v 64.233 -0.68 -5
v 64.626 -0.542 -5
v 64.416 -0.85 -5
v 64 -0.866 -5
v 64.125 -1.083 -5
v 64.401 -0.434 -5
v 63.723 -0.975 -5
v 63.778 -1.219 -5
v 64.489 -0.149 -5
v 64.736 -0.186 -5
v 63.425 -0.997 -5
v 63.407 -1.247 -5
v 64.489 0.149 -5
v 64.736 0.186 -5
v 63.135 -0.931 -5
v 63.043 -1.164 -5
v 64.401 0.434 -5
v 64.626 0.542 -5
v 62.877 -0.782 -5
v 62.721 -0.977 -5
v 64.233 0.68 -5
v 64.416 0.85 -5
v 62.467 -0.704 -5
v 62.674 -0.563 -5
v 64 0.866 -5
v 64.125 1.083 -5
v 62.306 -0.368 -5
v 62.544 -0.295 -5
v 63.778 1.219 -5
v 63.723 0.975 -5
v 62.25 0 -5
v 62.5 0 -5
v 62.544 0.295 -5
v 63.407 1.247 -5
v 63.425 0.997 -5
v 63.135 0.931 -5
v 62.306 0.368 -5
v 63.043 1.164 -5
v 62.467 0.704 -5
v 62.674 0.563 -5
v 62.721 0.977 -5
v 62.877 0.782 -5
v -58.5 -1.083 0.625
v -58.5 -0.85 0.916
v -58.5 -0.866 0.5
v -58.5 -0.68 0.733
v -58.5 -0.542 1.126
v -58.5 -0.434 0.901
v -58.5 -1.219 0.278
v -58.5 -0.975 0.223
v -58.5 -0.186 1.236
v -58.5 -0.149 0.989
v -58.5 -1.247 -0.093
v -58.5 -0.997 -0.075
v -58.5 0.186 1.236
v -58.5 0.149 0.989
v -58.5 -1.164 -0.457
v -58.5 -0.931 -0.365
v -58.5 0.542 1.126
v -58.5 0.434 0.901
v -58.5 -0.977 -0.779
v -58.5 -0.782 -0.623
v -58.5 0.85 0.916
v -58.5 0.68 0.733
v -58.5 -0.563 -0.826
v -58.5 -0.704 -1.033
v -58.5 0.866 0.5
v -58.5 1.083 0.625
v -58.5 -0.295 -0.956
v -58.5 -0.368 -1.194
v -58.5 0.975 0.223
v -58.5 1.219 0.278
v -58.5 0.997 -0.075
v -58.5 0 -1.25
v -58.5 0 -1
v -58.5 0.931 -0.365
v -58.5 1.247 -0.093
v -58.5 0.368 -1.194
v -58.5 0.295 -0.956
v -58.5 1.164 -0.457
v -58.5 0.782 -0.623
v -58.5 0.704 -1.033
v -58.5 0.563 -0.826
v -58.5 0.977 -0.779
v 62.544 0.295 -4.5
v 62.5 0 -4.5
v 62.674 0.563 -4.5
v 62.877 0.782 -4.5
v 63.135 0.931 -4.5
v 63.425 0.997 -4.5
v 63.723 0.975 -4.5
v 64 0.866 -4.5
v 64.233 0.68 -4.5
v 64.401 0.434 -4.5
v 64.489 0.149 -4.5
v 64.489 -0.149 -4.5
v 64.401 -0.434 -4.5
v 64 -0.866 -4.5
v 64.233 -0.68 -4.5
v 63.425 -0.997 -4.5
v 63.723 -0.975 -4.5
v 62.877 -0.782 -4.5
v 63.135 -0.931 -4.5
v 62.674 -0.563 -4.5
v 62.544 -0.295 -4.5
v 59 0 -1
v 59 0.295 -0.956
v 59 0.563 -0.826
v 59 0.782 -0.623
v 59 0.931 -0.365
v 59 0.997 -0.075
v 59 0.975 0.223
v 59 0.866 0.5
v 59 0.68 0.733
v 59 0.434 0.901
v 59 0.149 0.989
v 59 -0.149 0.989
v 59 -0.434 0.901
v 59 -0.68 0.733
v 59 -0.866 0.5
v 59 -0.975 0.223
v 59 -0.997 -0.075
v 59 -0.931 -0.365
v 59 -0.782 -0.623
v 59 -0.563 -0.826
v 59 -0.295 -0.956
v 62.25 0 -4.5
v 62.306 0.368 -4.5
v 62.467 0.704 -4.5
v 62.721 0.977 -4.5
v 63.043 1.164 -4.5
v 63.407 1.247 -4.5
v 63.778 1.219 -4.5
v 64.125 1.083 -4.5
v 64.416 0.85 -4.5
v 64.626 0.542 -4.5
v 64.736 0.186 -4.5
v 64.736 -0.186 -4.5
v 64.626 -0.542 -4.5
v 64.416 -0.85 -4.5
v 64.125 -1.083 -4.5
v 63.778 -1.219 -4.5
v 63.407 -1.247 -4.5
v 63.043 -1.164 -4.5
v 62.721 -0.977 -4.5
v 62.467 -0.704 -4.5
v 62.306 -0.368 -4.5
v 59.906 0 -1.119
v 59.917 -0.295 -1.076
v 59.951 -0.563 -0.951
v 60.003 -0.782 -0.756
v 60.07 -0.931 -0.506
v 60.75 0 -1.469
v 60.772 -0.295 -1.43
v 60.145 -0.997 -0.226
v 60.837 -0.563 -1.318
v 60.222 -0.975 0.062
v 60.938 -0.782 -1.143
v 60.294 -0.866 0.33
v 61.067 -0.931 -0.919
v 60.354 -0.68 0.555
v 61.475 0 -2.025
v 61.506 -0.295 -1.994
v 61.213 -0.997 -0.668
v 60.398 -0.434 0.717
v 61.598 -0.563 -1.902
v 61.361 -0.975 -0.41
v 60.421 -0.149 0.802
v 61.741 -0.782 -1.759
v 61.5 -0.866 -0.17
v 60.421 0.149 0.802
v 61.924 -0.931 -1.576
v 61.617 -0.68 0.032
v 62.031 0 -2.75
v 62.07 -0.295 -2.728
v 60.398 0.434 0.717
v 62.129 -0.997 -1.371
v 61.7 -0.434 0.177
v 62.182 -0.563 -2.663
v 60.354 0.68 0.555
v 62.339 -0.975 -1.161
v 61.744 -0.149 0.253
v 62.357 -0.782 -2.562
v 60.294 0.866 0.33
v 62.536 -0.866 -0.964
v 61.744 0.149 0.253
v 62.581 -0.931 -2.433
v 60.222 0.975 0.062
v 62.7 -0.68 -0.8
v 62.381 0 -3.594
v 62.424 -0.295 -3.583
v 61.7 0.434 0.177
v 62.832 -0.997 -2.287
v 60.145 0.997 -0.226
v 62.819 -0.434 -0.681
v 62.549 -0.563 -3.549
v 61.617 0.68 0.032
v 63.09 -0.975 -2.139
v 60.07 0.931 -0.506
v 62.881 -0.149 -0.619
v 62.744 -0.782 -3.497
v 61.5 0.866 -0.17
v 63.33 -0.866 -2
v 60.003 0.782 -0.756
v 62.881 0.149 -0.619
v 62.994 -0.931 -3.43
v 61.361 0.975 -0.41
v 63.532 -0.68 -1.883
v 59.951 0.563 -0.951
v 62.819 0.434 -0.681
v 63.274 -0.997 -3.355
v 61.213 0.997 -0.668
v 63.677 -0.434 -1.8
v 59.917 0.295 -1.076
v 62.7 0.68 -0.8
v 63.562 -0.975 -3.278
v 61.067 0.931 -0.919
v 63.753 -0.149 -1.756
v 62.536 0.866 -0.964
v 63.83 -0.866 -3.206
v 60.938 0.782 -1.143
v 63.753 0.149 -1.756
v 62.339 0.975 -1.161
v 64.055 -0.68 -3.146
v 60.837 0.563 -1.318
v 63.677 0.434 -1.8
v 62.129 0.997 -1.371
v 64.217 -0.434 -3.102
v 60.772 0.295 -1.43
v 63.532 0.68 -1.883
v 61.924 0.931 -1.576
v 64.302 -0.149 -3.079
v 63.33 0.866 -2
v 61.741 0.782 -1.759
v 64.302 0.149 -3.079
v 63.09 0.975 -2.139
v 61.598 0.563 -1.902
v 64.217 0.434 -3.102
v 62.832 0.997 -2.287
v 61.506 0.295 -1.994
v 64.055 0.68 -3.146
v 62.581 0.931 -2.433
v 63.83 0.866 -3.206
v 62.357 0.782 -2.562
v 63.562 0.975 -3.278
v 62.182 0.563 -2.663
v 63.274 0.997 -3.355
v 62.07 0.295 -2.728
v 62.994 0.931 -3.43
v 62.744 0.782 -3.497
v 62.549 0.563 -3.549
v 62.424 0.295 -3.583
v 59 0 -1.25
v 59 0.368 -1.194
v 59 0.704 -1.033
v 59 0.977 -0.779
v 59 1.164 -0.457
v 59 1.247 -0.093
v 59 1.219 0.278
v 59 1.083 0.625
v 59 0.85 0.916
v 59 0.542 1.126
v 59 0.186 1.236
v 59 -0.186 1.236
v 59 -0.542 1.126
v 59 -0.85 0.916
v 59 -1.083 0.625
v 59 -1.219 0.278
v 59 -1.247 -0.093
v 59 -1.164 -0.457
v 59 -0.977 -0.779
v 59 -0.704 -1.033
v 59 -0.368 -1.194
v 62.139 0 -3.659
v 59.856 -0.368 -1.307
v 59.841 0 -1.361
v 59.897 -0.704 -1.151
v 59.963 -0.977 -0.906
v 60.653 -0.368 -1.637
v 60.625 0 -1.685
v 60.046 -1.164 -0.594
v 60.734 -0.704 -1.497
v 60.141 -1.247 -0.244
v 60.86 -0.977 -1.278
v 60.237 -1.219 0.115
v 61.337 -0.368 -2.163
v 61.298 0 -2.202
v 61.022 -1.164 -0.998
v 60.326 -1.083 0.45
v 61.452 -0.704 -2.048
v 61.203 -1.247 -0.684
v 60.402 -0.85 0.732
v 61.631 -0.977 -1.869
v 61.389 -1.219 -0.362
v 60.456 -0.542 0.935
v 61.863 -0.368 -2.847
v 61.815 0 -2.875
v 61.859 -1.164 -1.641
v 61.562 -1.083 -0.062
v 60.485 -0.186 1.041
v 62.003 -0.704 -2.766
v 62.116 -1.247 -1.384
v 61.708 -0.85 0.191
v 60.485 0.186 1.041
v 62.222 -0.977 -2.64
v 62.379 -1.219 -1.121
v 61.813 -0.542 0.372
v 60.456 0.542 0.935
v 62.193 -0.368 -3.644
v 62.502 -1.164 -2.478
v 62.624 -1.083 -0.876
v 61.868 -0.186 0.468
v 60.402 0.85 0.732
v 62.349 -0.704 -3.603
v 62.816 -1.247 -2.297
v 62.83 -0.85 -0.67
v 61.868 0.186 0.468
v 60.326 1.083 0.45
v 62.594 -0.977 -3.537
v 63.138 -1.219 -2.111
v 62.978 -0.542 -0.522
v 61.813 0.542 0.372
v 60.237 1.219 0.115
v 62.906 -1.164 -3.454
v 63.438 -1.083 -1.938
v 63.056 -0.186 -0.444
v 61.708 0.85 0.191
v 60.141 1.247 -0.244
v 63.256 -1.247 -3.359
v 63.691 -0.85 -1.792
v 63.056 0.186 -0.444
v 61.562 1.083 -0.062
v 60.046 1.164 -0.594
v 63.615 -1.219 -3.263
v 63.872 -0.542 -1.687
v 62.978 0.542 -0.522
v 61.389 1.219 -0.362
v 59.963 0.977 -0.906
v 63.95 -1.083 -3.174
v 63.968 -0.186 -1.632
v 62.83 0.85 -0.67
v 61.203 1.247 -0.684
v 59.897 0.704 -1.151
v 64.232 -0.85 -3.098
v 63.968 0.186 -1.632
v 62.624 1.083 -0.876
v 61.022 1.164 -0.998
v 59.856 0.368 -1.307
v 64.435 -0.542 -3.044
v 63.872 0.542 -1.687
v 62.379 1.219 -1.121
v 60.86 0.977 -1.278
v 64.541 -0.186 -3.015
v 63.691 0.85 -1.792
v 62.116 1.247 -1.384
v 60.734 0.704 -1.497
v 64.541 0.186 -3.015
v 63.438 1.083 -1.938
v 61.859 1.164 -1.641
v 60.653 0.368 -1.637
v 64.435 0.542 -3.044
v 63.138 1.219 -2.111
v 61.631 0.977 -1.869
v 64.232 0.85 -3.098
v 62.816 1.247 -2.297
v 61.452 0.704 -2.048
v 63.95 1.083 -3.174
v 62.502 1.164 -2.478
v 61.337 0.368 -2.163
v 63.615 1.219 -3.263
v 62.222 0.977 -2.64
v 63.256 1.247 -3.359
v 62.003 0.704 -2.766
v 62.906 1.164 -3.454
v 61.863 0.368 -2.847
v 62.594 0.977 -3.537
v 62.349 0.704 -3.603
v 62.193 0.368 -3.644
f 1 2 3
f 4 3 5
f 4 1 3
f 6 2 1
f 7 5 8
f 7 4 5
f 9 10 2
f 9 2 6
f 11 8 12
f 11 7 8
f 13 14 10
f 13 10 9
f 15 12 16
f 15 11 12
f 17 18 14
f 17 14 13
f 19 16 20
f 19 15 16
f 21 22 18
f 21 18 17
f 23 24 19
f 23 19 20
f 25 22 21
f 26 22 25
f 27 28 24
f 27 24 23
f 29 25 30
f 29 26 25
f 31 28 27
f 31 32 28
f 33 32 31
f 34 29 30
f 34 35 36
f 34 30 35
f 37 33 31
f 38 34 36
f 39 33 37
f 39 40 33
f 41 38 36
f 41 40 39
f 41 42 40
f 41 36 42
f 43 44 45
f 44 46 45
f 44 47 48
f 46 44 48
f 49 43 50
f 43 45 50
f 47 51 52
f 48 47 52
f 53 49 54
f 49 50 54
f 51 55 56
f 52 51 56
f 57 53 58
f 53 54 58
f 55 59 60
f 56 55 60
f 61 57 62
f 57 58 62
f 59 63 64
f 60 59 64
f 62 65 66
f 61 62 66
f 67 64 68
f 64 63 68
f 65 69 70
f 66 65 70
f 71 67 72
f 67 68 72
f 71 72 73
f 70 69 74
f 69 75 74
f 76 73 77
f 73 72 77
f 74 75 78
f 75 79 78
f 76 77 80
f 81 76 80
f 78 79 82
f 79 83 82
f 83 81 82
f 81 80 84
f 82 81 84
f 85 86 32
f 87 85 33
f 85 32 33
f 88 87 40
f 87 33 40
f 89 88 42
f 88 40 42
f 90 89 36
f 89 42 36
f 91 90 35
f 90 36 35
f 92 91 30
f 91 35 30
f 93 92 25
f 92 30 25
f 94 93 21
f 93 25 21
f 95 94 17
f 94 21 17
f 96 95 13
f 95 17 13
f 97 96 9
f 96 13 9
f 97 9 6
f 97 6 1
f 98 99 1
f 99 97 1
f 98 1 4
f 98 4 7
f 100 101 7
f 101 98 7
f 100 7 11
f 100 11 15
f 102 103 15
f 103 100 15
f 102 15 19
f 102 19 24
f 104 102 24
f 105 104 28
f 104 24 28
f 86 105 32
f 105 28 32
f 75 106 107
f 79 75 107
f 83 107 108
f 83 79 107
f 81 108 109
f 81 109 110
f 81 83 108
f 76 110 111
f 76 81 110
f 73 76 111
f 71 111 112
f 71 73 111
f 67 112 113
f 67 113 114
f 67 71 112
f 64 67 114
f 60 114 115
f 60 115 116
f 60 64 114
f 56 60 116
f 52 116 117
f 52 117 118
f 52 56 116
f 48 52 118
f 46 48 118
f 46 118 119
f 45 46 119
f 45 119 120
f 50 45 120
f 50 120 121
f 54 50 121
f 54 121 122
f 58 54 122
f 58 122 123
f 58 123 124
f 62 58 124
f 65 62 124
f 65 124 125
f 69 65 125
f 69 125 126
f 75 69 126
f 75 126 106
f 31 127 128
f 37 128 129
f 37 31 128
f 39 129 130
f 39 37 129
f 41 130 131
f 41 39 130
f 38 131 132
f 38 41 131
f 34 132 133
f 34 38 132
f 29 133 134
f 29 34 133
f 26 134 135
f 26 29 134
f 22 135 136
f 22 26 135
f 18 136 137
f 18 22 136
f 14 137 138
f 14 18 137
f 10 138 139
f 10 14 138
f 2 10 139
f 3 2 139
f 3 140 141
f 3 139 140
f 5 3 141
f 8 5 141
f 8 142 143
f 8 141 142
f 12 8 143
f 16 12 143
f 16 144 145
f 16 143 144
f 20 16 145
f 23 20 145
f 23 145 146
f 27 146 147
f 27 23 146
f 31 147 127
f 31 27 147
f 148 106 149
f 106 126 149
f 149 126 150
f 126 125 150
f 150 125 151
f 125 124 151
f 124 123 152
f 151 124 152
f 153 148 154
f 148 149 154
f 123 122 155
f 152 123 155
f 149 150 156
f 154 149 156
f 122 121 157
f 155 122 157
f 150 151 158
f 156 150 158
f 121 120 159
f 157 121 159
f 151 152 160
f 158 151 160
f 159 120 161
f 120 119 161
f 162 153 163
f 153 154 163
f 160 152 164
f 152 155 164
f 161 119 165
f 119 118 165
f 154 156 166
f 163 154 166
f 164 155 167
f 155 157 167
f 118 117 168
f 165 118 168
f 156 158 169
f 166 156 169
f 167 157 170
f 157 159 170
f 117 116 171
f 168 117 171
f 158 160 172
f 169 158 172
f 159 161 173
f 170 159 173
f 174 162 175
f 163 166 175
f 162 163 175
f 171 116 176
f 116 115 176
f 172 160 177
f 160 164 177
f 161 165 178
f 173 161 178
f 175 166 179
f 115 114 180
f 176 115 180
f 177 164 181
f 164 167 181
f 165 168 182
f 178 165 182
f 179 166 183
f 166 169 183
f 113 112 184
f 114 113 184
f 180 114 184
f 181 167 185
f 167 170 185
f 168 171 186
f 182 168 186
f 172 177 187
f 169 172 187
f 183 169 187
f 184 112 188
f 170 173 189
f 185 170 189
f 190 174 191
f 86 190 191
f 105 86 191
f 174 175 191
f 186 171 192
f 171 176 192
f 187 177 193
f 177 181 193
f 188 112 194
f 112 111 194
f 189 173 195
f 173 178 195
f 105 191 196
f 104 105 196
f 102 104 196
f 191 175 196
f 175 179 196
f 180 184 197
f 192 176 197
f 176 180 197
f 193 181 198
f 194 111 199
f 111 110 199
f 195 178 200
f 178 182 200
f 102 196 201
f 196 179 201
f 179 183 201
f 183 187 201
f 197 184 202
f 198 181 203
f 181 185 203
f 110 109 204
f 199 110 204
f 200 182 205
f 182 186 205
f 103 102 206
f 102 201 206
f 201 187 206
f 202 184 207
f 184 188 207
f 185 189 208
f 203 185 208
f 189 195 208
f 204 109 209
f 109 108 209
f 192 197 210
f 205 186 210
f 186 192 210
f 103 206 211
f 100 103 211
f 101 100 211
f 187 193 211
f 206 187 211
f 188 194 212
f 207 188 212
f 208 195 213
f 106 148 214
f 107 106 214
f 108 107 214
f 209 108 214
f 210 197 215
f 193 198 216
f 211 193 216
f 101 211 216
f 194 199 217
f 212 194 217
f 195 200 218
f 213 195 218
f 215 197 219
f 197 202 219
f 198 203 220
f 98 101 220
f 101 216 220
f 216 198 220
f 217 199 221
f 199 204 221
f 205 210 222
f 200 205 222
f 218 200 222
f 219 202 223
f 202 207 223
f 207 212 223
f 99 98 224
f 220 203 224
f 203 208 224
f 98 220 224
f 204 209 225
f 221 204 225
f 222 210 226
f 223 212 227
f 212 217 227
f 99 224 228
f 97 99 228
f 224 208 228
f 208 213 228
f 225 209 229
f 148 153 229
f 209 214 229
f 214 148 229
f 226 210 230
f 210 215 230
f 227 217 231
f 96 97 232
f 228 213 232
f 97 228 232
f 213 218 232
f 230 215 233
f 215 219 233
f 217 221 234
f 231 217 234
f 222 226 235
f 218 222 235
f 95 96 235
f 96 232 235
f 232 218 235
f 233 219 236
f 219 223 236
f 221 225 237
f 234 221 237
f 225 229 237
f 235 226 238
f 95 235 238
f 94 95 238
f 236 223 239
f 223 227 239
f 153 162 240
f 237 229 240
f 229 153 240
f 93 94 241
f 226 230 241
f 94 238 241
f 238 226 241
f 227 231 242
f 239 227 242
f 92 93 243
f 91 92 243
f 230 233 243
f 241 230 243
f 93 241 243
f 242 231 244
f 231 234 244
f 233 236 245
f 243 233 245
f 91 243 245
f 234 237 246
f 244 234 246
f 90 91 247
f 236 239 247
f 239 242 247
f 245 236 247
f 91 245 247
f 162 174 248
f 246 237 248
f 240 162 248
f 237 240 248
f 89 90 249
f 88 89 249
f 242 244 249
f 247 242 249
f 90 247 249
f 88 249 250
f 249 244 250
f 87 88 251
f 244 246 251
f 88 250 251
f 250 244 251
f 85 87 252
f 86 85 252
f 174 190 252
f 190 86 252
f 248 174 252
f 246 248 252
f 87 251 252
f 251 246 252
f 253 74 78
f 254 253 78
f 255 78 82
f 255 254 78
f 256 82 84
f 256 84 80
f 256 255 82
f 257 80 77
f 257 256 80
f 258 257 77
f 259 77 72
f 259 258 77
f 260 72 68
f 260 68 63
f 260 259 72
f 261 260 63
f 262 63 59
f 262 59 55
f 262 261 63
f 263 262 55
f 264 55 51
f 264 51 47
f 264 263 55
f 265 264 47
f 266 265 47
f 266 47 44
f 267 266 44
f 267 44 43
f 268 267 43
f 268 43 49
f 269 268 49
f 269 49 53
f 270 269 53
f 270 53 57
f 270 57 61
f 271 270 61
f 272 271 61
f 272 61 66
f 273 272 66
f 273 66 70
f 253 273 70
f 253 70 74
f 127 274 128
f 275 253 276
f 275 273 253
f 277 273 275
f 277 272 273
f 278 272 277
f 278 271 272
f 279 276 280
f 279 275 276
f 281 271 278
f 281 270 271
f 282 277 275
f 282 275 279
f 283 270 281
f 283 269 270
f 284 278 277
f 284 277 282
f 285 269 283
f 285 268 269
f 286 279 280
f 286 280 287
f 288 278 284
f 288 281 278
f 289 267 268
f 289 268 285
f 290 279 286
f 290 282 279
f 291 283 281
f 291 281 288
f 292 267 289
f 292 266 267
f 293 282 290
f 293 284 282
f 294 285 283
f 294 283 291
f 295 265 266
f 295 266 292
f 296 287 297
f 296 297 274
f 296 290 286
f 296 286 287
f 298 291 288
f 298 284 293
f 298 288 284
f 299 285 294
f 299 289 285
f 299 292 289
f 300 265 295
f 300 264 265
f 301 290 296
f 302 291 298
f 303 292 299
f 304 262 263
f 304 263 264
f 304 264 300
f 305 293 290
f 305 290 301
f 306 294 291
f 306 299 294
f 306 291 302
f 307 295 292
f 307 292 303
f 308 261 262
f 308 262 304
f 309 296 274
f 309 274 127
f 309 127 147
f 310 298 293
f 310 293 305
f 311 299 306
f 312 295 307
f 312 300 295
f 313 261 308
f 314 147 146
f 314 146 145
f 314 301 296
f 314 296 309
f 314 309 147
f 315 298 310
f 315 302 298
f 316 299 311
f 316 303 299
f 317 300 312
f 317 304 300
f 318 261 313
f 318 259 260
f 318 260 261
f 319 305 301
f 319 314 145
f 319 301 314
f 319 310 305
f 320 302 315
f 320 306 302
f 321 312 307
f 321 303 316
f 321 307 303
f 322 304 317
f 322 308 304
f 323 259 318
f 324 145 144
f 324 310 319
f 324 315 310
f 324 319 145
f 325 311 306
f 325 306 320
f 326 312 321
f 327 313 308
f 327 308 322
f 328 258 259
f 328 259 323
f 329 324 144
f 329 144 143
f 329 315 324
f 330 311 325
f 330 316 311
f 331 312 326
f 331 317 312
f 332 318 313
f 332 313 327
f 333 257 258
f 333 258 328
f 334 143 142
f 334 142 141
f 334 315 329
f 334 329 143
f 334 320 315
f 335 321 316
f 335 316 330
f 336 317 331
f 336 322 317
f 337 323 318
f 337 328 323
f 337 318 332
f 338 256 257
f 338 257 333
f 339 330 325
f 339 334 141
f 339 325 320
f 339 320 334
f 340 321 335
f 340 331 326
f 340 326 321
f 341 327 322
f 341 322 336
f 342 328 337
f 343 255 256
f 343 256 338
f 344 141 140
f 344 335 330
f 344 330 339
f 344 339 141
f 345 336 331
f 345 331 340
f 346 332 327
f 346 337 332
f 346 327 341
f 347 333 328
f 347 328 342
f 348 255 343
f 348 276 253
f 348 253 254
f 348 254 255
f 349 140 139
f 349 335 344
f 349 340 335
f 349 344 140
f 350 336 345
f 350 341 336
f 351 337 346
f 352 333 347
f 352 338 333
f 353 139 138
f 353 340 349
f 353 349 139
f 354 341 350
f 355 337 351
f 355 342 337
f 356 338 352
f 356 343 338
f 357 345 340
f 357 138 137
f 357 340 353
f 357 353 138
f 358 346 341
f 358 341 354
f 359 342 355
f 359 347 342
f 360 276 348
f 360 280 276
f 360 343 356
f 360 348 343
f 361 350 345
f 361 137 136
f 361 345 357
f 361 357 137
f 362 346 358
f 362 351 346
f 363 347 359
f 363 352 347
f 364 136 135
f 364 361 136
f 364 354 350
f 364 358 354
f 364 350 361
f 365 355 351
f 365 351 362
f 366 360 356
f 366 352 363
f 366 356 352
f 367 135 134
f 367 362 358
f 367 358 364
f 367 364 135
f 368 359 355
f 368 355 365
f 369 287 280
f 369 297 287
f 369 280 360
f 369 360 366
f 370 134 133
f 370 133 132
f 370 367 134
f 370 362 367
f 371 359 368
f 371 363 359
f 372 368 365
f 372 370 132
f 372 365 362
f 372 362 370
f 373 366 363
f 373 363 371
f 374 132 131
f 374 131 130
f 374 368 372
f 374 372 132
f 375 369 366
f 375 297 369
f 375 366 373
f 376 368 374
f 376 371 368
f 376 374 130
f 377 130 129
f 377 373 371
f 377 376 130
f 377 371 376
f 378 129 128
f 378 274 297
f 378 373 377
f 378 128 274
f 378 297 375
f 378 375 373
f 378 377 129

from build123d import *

# Parameters (mm, degrees)
SKIZZE1_R                       = 1.25
SKIZZE1_R_2                     = 1
AUFSATZ_LINEAR_AUSTRAGEN1_DEPTH = 58.5
SKIZZE2_R                       = 1.25
SKIZZE2_R_2                     = 1


with BuildPart() as part:
    # Skizze1 → Aufsatz-Linear austragen1 (new, symmetric)
    with BuildSketch(Plane(origin=(0, 0, 0), x_dir=(0, 0, -1), z_dir=(1, 0, 0))):
        Circle(SKIZZE1_R)
        Circle(SKIZZE1_R_2, mode=Mode.SUBTRACT)
    extrude(amount=AUFSATZ_LINEAR_AUSTRAGEN1_DEPTH, both=True)

    # Austragung1: sweep along a path in Skizze3
    with BuildLine(Plane(origin=(0, 0, 0), x_dir=(1, 0, 0), z_dir=(0, 1, 0))) as austragung1_path:
        Line((58.5, 0), (59, 0))
        ThreePointArc((59, 0), (62.181980515, 1.318019485), (63.5, 4.5))
        Line((63.5, 4.5), (63.5, 5))
    # Skizze2 → Austragung1 (sweep)
    with BuildSketch(Plane(origin=(58.5, 0, 0), x_dir=(0, 0, -1), z_dir=(1, 0, 0))):
        Circle(SKIZZE2_R)
        Circle(SKIZZE2_R_2, mode=Mode.SUBTRACT)
    sweep(path=austragung1_path.line)


solid = part.part
